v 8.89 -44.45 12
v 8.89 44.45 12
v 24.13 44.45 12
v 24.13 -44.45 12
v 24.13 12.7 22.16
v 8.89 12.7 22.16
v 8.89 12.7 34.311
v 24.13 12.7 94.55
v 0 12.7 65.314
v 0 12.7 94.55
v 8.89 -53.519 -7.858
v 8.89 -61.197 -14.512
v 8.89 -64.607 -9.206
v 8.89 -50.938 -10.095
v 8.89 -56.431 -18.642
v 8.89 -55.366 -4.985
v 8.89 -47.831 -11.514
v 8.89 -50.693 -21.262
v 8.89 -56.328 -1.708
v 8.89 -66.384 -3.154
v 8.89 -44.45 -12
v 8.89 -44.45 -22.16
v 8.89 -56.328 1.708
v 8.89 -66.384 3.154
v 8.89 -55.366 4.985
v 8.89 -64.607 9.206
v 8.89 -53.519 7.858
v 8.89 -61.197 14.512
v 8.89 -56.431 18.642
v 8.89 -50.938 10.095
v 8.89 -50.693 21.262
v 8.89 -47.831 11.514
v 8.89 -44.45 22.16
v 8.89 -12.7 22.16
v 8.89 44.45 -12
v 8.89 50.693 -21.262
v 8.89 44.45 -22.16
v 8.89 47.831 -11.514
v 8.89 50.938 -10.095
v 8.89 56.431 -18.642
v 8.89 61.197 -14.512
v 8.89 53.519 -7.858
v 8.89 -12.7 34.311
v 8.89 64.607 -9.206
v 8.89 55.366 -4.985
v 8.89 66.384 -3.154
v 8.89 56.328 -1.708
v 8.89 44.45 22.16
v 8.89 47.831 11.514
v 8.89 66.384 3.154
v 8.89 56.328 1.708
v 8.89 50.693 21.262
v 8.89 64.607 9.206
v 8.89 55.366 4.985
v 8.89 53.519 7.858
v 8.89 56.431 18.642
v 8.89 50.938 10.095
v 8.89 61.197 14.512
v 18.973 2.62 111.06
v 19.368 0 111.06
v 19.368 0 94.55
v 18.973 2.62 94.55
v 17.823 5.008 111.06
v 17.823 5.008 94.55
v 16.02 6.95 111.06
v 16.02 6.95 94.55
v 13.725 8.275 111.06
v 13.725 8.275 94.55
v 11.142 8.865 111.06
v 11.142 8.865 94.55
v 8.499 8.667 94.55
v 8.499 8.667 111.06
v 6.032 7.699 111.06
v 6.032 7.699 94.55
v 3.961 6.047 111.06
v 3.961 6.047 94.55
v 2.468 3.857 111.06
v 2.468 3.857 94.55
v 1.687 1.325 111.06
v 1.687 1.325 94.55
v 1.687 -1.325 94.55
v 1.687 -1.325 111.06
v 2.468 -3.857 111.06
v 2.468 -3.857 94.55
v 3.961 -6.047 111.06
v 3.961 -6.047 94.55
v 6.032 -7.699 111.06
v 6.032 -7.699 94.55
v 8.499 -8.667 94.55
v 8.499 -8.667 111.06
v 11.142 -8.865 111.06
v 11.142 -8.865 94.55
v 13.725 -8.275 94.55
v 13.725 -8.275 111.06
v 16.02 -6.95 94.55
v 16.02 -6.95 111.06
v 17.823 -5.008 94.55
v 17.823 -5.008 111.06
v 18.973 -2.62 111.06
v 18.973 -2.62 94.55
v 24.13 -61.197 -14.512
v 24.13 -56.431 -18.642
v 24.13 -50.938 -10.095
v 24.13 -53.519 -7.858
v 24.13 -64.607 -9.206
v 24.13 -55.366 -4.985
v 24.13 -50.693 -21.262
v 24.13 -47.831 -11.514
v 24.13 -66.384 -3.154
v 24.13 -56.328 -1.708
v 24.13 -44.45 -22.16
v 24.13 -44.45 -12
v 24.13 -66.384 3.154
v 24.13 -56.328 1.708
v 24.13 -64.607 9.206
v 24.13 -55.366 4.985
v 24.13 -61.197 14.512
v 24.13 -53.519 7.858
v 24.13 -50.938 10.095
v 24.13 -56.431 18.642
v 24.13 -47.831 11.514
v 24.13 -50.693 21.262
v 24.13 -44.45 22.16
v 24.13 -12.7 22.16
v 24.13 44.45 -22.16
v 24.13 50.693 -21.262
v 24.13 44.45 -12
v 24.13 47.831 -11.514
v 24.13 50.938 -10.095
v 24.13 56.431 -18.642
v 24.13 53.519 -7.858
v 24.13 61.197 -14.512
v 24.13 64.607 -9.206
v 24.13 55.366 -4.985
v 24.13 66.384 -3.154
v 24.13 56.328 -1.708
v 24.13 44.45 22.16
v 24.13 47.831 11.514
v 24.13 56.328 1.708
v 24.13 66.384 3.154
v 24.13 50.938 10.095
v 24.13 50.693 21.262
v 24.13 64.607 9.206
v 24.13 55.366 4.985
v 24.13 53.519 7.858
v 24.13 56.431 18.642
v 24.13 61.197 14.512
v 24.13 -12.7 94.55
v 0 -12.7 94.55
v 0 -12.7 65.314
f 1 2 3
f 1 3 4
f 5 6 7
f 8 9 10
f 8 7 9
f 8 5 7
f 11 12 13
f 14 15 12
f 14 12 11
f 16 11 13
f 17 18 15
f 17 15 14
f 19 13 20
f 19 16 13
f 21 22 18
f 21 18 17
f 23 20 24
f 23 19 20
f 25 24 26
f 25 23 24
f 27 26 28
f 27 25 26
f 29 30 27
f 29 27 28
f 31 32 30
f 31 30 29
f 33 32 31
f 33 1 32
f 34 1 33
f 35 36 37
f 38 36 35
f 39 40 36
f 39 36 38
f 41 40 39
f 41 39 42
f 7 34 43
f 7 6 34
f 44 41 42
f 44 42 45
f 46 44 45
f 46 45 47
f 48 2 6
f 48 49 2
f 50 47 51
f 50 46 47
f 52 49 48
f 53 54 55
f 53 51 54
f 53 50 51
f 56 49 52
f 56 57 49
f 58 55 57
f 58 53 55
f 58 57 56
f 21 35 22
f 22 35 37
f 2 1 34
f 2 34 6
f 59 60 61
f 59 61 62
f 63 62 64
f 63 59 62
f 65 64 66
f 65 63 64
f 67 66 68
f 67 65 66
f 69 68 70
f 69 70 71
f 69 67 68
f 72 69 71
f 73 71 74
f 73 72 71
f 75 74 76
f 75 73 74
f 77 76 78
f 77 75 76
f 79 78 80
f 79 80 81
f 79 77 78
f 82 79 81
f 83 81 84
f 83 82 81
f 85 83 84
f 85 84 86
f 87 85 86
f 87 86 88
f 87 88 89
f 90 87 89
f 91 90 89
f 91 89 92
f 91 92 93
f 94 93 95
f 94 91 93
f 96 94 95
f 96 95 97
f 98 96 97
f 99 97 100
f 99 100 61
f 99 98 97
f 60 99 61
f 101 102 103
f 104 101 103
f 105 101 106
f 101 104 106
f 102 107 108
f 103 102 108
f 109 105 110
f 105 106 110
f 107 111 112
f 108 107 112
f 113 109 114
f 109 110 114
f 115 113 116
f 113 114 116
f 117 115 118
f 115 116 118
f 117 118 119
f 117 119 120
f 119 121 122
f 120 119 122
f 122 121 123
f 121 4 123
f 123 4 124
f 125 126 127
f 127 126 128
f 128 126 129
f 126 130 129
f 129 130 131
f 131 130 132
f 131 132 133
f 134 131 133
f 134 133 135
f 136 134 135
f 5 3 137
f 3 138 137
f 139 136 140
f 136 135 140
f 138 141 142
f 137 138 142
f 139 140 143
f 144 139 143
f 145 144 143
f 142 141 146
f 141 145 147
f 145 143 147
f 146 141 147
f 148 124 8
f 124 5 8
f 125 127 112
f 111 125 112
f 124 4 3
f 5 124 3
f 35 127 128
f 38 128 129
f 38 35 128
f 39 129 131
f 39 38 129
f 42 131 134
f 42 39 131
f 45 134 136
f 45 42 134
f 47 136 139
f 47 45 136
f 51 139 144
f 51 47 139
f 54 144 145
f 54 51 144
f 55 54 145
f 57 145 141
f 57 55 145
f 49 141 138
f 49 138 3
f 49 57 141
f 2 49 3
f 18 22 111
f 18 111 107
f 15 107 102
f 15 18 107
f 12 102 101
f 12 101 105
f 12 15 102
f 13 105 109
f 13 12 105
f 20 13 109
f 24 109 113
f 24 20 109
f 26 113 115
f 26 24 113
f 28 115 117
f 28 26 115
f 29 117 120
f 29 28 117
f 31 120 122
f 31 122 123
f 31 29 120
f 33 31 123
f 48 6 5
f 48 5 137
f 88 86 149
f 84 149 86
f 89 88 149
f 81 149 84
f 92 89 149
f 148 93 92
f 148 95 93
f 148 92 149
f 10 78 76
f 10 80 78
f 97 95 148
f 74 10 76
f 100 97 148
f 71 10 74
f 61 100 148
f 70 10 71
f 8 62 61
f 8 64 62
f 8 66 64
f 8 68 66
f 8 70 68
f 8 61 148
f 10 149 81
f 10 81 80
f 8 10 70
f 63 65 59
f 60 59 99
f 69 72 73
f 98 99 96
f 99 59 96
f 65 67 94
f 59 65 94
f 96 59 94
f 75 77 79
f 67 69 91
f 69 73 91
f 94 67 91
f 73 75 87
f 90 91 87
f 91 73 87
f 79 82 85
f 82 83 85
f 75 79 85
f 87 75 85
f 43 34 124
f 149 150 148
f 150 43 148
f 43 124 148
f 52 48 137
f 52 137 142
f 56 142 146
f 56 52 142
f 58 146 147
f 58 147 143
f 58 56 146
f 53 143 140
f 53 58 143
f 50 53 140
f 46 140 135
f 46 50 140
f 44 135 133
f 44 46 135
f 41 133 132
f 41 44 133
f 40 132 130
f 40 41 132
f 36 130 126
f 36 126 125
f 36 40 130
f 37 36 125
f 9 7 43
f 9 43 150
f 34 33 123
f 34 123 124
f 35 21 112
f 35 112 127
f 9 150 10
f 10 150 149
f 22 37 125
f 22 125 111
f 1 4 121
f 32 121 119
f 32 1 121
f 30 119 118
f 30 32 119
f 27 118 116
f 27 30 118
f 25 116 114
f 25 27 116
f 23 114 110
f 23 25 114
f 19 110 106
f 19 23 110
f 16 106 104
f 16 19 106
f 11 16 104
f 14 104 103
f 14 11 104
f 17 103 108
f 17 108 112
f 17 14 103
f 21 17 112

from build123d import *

# Parameters (mm, degrees)
BOSS_EXTRUDE2_DEPTH = 24.13
SKETCH3_W           = 24.13
SKETCH3_H           = 25.4
SKETCH3_R           = 8.89
CUT_EXTRUDE3_DEPTH  = 16.51
SKETCH4_W           = 138.37052371
SKETCH4_H           = 157.28988693
CUT_EXTRUDE4_DEPTH  = 8.89
CHAMFER1_SIZE       = 34.874144438
CHAMFER1_SIZE_2     = 10


with BuildPart() as part:
    # Sketch2 → Boss-Extrude2 (new body)
    # profile 1 of 2: a face of its own
    with BuildSketch(Plane(origin=(0, 0, 0), x_dir=(0, 0, -1), z_dir=(1, 0, 0))):
        Polygon((-111.06, -12.7), (-22.16, -12.7), (-22.16, 0), (-22.16, 12.7), (-111.06, 12.7), align=None)
    # profile 2 of 2: a face of its own
    with BuildSketch(Plane(origin=(0, 0, 0), x_dir=(0, 0, -1), z_dir=(1, 0, 0))):
        with BuildLine():
            Line((-22.16, -44.45), (-22.16, 44.45))
            ThreePointArc((-22.16, 44.45), (0, 66.61), (22.16, 44.45))
            Line((22.16, 44.45), (22.16, -44.45))
            ThreePointArc((22.16, -44.45), (0, -66.61), (-22.16, -44.45))
        make_face()
        with BuildLine():
            ThreePointArc((12, 44.45), (0, 56.45), (-12, 44.45))
            Line((-12, 44.45), (-12, -44.45))
            ThreePointArc((-12, -44.45), (0, -56.45), (12, -44.45))
            Line((12, -44.45), (12, 44.45))
        make_face(mode=Mode.SUBTRACT)
    extrude(amount=BOSS_EXTRUDE2_DEPTH)

    # Sketch3 → Cut-Extrude3 (cut)
    with BuildSketch(Plane.XY.offset(111.06)):
        with Locations((12.065, 0)):
            Rectangle(SKETCH3_W, SKETCH3_H)
        with Locations((10.4775, 0)):
            Circle(SKETCH3_R, mode=Mode.SUBTRACT)
    extrude(amount=-CUT_EXTRUDE3_DEPTH, mode=Mode.SUBTRACT)

    # Sketch4 → Cut-Extrude4 (cut)
    with BuildSketch(Plane.ZY):
        Rectangle(SKETCH4_W, SKETCH4_H)
    extrude(amount=-CUT_EXTRUDE4_DEPTH, mode=Mode.SUBTRACT)

    # Chamfer1
    # the kernel refuses this chamfer: 34.874144438, 10 mm, written as the material it adds along each edge
    with BuildSketch(Plane(origin=(8.89, 12.7, 69.185261855), x_dir=(0.010616657410321159, 0, -0.9999436417045873), z_dir=(0, -1, 0))) as chamfer1_piece_1_section:
        Polygon((CHAMFER1_SIZE * 0.999943641716, -CHAMFER1_SIZE * 0.0106166574104), (-CHAMFER1_SIZE_2 * 0.0106166574103, -CHAMFER1_SIZE_2 * 0.999943641705), (0, 0), align=None)
    chamfer1_piece_1 = extrude(amount=25.4, mode=Mode.PRIVATE)
    chamfer1_piece_1 = split(chamfer1_piece_1, bisect_by=Plane(origin=(0, 0, 56.832486902), z_dir=(1, 0, 0)), keep=Keep.TOP, mode=Mode.PRIVATE)
    add(chamfer1_piece_1)


solid = part.part
